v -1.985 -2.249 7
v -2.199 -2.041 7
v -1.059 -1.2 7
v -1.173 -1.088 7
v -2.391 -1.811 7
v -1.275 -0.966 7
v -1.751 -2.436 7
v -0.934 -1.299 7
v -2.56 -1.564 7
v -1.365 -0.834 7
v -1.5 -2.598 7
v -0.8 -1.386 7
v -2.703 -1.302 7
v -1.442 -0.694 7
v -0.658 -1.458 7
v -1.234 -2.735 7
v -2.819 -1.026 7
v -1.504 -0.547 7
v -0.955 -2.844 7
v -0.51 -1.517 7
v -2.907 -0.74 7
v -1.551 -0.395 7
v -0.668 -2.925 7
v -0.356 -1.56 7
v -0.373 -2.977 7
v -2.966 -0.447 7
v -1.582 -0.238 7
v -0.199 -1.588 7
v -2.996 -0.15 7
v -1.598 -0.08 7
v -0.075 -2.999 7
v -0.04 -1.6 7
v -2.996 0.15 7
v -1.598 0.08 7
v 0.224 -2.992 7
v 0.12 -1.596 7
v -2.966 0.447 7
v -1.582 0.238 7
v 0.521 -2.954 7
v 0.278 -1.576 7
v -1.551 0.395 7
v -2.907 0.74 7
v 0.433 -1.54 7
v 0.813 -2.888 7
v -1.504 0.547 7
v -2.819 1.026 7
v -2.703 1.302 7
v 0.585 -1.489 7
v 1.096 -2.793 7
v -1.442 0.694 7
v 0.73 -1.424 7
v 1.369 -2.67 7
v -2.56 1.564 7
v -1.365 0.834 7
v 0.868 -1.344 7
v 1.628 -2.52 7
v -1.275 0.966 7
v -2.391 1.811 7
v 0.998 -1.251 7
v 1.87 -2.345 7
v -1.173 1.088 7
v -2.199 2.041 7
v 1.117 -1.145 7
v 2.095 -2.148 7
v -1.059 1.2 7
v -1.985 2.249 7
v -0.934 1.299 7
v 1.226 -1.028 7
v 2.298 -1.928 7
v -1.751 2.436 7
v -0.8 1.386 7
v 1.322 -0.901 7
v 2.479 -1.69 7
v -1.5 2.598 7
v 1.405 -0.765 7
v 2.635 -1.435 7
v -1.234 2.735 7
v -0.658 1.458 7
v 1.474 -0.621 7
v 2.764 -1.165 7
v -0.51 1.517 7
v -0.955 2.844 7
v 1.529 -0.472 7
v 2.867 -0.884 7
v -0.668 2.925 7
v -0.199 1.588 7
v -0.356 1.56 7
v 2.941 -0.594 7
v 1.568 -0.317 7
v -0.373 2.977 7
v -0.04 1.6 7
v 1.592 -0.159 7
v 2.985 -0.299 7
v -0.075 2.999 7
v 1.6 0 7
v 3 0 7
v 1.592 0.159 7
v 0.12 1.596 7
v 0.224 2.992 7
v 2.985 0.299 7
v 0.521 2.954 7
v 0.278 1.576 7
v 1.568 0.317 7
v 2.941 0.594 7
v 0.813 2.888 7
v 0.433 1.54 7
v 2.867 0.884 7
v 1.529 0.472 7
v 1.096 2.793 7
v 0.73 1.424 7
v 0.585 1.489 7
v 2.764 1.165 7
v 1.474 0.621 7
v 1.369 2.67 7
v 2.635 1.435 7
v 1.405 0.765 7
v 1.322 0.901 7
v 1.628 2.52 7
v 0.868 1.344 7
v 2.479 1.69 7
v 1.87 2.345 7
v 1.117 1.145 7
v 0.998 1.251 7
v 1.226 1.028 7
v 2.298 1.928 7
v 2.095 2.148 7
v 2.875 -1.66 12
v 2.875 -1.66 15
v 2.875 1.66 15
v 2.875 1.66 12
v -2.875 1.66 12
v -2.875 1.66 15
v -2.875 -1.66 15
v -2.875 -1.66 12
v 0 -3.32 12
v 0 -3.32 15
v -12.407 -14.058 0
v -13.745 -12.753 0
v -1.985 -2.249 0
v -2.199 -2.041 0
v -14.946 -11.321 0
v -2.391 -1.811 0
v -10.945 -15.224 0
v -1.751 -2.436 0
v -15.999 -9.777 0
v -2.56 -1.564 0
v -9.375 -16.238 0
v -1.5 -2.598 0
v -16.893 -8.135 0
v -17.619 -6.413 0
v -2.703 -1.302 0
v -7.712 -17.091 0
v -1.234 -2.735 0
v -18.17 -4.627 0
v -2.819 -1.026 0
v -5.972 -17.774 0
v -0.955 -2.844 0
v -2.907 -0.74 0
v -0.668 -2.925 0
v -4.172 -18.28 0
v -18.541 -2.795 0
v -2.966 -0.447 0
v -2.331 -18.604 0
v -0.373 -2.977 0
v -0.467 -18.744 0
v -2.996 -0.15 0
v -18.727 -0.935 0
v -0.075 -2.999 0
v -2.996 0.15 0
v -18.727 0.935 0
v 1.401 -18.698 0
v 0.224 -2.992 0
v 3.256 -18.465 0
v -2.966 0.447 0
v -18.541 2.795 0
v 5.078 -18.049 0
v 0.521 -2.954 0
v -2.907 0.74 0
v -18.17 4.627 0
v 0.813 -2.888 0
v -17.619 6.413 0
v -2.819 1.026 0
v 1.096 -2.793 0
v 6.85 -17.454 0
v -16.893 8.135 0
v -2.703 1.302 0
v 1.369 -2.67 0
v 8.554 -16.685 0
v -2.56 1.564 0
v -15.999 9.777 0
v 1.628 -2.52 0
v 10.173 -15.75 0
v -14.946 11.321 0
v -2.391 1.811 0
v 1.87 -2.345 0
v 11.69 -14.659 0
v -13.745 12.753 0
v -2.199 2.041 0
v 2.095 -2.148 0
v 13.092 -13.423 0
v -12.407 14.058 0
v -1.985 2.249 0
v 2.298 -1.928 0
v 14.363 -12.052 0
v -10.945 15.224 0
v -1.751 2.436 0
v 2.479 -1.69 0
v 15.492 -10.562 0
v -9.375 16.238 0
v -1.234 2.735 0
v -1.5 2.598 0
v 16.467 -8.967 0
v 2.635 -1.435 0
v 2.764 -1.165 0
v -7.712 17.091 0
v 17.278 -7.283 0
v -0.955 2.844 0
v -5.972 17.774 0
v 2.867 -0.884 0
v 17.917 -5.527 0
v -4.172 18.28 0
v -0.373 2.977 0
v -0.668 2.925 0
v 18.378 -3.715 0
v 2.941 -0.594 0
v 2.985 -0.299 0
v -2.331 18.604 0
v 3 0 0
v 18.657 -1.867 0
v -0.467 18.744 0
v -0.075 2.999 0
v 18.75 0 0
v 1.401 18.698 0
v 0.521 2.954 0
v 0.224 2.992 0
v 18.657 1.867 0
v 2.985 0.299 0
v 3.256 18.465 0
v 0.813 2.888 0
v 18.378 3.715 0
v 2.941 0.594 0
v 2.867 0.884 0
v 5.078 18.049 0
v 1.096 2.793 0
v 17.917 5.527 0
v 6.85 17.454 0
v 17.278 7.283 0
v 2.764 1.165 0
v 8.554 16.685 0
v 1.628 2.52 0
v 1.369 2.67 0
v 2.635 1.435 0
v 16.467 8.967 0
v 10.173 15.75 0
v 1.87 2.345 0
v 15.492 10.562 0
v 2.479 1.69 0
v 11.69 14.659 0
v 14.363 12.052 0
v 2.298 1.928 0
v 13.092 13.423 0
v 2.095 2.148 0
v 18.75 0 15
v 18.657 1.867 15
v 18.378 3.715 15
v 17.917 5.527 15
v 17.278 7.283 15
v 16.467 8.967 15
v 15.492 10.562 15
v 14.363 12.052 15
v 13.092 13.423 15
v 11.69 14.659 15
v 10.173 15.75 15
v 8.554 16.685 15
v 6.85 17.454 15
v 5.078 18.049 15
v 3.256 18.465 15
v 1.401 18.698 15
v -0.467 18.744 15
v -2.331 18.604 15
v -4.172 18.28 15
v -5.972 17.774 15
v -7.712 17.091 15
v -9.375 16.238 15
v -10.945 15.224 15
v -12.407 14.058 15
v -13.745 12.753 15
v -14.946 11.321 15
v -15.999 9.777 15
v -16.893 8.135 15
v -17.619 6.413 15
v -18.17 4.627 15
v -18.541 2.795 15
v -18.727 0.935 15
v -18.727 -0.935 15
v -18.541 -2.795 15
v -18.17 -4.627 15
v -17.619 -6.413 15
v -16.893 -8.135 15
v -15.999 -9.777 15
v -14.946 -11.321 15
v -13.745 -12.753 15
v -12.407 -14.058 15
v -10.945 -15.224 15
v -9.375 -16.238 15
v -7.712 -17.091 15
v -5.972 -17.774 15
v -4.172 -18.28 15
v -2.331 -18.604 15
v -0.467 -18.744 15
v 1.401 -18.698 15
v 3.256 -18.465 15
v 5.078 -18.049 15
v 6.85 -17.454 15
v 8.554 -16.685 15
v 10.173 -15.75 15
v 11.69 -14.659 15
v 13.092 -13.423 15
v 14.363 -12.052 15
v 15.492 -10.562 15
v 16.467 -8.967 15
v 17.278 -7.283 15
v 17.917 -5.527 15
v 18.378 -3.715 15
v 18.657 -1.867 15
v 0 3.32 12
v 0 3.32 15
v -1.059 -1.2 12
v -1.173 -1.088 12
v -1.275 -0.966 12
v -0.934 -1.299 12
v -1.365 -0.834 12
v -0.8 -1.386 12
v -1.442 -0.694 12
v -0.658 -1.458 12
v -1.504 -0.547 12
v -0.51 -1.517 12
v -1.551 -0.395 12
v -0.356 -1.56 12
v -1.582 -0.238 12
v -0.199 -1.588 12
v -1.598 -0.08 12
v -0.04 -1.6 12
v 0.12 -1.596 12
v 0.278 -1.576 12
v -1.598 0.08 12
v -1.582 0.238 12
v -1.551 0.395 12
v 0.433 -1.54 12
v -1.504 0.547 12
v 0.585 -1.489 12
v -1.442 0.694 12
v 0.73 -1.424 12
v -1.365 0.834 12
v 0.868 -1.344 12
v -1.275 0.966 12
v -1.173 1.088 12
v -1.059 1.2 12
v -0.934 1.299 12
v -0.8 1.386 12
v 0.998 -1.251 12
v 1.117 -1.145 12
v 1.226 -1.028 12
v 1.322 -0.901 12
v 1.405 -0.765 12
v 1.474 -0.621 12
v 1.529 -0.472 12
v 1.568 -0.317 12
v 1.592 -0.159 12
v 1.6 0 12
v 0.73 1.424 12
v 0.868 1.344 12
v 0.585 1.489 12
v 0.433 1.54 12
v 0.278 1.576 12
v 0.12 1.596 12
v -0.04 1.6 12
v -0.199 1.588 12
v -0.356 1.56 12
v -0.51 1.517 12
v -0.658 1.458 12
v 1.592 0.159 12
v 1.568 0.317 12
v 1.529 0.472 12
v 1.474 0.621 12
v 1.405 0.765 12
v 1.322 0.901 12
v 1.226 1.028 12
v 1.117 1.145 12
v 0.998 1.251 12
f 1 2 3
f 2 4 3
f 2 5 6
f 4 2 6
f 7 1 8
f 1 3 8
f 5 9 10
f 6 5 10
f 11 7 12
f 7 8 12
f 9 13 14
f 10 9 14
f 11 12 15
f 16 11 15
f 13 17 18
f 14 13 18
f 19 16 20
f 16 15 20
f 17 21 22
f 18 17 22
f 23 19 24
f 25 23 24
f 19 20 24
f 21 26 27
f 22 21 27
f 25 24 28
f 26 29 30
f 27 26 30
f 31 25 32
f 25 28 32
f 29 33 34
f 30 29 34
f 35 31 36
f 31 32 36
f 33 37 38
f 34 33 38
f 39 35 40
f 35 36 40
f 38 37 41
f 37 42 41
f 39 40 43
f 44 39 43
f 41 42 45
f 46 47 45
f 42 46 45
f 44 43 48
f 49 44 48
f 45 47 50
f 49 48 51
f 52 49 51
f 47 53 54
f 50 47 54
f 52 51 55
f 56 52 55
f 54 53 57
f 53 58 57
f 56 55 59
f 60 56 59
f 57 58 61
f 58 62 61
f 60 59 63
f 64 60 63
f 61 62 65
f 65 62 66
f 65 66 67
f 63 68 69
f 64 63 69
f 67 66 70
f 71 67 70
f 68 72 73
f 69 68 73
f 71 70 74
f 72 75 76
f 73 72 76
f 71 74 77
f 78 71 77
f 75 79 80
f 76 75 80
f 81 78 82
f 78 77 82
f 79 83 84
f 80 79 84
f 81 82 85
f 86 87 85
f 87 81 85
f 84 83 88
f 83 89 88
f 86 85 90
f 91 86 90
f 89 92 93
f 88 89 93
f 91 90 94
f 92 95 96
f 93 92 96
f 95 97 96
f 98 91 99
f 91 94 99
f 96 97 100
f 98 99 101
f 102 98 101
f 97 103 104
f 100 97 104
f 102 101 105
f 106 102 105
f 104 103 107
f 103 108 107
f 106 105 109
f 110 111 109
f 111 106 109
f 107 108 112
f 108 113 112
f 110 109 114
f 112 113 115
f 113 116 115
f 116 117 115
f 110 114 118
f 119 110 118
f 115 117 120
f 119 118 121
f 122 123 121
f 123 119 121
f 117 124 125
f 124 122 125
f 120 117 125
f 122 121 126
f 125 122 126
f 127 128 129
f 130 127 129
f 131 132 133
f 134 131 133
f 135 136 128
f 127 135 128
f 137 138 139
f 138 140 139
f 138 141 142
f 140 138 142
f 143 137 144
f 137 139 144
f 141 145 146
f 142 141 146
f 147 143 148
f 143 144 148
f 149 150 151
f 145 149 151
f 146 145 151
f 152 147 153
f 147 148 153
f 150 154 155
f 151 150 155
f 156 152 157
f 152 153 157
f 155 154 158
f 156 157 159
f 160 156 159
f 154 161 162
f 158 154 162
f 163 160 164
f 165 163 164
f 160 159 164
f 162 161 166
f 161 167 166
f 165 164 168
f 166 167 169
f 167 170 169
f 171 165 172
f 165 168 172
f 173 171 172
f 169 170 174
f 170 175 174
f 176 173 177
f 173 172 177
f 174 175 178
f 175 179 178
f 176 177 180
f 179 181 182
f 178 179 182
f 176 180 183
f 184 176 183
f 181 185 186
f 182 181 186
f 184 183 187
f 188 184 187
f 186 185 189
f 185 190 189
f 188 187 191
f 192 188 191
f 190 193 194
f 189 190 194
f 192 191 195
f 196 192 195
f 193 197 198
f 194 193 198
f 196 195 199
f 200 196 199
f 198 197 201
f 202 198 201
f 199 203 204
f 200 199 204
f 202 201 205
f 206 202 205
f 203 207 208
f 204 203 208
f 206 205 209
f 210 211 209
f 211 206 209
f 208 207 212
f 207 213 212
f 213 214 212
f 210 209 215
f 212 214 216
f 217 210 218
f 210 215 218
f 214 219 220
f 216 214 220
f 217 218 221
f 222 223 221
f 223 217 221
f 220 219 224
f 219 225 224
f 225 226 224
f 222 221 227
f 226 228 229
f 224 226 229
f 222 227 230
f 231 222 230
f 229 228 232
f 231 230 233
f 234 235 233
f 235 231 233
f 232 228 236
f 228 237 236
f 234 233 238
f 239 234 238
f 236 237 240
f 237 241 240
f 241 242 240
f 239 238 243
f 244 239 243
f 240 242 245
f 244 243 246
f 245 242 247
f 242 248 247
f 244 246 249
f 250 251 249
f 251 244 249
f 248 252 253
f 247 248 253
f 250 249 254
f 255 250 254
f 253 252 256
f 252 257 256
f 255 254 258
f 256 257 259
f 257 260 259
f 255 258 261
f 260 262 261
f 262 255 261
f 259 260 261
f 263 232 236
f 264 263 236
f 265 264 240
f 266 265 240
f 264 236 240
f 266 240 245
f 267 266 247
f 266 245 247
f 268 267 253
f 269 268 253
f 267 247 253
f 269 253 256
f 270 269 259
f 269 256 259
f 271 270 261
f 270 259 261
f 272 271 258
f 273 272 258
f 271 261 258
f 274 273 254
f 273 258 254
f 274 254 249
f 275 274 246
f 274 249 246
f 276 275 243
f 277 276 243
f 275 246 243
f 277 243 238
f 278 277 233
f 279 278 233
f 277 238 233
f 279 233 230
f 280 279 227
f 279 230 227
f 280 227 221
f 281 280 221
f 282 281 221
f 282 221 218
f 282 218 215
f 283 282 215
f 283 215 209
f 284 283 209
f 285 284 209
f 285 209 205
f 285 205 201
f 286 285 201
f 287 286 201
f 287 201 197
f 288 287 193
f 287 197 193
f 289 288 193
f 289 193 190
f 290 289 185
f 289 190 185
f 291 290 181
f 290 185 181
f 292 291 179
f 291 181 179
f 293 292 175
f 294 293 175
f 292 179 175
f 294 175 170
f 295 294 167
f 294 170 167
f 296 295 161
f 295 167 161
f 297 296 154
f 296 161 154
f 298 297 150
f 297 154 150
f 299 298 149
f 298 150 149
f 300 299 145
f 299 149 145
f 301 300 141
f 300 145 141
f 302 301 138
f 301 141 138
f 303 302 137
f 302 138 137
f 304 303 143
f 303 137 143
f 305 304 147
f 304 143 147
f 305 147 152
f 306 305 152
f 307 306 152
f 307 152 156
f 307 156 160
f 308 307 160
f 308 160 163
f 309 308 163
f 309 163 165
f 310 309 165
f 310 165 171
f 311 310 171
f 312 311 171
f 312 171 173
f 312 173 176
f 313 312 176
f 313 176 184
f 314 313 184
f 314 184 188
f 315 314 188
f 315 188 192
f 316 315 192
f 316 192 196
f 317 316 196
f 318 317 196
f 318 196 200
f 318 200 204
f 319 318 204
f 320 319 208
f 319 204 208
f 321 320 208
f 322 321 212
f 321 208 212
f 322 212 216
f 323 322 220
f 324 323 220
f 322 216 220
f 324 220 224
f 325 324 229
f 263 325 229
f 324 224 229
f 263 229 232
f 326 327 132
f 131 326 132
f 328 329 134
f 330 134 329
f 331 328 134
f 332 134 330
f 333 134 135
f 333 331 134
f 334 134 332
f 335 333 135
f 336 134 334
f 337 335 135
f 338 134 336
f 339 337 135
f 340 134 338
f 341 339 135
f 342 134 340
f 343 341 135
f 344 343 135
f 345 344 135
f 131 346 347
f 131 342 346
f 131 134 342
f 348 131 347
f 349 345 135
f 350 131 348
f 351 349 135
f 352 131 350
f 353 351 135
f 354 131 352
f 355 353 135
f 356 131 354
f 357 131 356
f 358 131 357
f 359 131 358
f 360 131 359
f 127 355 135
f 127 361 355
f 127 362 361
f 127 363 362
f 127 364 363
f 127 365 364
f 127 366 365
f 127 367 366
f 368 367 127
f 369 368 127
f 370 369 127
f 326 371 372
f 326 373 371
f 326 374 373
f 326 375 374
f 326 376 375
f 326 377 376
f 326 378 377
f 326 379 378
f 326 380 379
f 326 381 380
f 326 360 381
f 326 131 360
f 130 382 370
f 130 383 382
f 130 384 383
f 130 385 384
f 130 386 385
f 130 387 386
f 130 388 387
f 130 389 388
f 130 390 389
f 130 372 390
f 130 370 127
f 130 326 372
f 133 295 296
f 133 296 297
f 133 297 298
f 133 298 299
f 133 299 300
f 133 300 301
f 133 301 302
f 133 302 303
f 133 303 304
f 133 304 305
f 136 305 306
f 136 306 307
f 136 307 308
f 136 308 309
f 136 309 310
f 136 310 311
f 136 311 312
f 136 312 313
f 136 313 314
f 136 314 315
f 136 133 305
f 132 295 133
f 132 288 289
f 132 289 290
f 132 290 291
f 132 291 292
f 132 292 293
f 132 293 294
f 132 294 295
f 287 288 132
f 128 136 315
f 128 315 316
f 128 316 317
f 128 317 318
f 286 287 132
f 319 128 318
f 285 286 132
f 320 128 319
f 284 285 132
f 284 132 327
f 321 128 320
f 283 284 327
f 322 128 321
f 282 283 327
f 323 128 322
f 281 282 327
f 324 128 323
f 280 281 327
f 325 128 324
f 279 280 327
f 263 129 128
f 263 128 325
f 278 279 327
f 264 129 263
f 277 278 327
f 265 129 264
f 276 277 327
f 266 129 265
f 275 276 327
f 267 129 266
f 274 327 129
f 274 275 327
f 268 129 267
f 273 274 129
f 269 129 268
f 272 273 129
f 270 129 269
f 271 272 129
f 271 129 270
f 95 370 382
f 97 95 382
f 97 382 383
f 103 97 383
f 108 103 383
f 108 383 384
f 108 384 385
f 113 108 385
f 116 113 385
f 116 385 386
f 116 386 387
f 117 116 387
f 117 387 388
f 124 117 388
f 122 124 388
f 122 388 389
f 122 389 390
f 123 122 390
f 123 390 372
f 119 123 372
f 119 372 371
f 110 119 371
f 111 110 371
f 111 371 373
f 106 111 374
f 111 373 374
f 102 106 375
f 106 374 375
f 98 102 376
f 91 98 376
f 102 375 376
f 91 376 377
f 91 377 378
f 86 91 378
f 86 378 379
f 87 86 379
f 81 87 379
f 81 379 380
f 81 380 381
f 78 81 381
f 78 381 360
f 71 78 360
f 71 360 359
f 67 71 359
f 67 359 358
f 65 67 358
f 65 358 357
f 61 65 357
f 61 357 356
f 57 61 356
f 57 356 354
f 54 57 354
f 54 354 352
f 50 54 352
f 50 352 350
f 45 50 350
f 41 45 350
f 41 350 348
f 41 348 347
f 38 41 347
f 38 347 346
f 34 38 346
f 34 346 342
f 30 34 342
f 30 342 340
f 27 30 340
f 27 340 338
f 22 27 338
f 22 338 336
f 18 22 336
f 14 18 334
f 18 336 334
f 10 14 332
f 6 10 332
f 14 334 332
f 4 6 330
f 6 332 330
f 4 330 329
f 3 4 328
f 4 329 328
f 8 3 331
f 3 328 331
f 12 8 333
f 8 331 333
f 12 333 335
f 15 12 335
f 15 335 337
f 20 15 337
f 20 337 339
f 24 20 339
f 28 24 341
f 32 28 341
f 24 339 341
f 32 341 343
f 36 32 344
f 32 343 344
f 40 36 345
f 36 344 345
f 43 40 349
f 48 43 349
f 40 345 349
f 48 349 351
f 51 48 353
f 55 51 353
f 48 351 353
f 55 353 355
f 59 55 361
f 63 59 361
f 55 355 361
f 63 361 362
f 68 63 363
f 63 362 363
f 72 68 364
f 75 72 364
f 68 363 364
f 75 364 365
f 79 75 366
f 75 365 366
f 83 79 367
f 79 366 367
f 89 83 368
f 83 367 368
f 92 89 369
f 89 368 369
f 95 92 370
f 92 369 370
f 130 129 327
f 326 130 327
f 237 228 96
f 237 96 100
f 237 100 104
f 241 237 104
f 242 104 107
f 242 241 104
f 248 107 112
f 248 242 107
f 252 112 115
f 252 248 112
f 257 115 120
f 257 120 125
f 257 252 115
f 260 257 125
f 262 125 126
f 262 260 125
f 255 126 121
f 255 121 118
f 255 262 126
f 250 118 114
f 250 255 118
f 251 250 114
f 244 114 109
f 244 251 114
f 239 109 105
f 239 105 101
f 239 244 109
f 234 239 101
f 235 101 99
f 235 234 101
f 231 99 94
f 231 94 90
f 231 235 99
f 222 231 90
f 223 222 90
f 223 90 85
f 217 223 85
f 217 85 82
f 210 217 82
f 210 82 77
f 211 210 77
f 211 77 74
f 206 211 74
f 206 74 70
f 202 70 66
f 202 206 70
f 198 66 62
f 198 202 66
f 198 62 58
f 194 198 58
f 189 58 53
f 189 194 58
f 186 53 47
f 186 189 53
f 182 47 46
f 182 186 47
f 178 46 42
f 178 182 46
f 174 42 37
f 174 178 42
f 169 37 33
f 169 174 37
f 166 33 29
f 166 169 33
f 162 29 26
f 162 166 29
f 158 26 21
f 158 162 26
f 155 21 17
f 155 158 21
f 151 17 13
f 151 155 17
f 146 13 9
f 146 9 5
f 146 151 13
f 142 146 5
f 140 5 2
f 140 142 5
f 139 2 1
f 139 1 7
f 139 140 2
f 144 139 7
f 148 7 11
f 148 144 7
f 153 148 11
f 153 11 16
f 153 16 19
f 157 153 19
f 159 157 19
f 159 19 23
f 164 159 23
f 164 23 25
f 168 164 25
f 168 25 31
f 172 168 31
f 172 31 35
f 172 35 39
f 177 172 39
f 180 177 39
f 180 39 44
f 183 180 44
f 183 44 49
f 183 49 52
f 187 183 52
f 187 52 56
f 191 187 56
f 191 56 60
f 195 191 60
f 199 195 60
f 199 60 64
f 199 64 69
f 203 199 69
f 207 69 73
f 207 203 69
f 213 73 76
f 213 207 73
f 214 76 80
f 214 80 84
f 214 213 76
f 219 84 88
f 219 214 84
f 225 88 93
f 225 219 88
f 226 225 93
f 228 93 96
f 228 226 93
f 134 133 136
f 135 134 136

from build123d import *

# Parameters (mm, degrees)
F0_R     = 18.75
F1_DEPTH = 15
F3_DEPTH = 3
F4_R     = 1.6
F5_DEPTH = 25
F6_R     = 3
F7_DEPTH = 7


with BuildPart() as f1:
    # F0 (on Top) → F1 (new body)
    with BuildSketch(Plane.XY):
        Circle(F0_R)
    extrude(amount=F1_DEPTH)

    # F2 (on face) → F3 (cut)
    with BuildSketch(Plane.XY.offset(15)):
        Polygon((2.875, -1.659882), (2.875, 1.659882), (0, 3.319764), (-2.875, 1.659882), (-2.875, -1.659882), (0, -3.319764), align=None)
    extrude(amount=-F3_DEPTH, mode=Mode.SUBTRACT)

    # F4 (on face) → F5 (cut)
    with BuildSketch(Plane.XY.offset(12)):
        Circle(F4_R)
    extrude(amount=-F5_DEPTH, mode=Mode.SUBTRACT)

    # F6 (on face) → F7 (cut)
    with BuildSketch(Plane.XY):
        Circle(F6_R)
    extrude(amount=F7_DEPTH, mode=Mode.SUBTRACT)


solid = f1.part
